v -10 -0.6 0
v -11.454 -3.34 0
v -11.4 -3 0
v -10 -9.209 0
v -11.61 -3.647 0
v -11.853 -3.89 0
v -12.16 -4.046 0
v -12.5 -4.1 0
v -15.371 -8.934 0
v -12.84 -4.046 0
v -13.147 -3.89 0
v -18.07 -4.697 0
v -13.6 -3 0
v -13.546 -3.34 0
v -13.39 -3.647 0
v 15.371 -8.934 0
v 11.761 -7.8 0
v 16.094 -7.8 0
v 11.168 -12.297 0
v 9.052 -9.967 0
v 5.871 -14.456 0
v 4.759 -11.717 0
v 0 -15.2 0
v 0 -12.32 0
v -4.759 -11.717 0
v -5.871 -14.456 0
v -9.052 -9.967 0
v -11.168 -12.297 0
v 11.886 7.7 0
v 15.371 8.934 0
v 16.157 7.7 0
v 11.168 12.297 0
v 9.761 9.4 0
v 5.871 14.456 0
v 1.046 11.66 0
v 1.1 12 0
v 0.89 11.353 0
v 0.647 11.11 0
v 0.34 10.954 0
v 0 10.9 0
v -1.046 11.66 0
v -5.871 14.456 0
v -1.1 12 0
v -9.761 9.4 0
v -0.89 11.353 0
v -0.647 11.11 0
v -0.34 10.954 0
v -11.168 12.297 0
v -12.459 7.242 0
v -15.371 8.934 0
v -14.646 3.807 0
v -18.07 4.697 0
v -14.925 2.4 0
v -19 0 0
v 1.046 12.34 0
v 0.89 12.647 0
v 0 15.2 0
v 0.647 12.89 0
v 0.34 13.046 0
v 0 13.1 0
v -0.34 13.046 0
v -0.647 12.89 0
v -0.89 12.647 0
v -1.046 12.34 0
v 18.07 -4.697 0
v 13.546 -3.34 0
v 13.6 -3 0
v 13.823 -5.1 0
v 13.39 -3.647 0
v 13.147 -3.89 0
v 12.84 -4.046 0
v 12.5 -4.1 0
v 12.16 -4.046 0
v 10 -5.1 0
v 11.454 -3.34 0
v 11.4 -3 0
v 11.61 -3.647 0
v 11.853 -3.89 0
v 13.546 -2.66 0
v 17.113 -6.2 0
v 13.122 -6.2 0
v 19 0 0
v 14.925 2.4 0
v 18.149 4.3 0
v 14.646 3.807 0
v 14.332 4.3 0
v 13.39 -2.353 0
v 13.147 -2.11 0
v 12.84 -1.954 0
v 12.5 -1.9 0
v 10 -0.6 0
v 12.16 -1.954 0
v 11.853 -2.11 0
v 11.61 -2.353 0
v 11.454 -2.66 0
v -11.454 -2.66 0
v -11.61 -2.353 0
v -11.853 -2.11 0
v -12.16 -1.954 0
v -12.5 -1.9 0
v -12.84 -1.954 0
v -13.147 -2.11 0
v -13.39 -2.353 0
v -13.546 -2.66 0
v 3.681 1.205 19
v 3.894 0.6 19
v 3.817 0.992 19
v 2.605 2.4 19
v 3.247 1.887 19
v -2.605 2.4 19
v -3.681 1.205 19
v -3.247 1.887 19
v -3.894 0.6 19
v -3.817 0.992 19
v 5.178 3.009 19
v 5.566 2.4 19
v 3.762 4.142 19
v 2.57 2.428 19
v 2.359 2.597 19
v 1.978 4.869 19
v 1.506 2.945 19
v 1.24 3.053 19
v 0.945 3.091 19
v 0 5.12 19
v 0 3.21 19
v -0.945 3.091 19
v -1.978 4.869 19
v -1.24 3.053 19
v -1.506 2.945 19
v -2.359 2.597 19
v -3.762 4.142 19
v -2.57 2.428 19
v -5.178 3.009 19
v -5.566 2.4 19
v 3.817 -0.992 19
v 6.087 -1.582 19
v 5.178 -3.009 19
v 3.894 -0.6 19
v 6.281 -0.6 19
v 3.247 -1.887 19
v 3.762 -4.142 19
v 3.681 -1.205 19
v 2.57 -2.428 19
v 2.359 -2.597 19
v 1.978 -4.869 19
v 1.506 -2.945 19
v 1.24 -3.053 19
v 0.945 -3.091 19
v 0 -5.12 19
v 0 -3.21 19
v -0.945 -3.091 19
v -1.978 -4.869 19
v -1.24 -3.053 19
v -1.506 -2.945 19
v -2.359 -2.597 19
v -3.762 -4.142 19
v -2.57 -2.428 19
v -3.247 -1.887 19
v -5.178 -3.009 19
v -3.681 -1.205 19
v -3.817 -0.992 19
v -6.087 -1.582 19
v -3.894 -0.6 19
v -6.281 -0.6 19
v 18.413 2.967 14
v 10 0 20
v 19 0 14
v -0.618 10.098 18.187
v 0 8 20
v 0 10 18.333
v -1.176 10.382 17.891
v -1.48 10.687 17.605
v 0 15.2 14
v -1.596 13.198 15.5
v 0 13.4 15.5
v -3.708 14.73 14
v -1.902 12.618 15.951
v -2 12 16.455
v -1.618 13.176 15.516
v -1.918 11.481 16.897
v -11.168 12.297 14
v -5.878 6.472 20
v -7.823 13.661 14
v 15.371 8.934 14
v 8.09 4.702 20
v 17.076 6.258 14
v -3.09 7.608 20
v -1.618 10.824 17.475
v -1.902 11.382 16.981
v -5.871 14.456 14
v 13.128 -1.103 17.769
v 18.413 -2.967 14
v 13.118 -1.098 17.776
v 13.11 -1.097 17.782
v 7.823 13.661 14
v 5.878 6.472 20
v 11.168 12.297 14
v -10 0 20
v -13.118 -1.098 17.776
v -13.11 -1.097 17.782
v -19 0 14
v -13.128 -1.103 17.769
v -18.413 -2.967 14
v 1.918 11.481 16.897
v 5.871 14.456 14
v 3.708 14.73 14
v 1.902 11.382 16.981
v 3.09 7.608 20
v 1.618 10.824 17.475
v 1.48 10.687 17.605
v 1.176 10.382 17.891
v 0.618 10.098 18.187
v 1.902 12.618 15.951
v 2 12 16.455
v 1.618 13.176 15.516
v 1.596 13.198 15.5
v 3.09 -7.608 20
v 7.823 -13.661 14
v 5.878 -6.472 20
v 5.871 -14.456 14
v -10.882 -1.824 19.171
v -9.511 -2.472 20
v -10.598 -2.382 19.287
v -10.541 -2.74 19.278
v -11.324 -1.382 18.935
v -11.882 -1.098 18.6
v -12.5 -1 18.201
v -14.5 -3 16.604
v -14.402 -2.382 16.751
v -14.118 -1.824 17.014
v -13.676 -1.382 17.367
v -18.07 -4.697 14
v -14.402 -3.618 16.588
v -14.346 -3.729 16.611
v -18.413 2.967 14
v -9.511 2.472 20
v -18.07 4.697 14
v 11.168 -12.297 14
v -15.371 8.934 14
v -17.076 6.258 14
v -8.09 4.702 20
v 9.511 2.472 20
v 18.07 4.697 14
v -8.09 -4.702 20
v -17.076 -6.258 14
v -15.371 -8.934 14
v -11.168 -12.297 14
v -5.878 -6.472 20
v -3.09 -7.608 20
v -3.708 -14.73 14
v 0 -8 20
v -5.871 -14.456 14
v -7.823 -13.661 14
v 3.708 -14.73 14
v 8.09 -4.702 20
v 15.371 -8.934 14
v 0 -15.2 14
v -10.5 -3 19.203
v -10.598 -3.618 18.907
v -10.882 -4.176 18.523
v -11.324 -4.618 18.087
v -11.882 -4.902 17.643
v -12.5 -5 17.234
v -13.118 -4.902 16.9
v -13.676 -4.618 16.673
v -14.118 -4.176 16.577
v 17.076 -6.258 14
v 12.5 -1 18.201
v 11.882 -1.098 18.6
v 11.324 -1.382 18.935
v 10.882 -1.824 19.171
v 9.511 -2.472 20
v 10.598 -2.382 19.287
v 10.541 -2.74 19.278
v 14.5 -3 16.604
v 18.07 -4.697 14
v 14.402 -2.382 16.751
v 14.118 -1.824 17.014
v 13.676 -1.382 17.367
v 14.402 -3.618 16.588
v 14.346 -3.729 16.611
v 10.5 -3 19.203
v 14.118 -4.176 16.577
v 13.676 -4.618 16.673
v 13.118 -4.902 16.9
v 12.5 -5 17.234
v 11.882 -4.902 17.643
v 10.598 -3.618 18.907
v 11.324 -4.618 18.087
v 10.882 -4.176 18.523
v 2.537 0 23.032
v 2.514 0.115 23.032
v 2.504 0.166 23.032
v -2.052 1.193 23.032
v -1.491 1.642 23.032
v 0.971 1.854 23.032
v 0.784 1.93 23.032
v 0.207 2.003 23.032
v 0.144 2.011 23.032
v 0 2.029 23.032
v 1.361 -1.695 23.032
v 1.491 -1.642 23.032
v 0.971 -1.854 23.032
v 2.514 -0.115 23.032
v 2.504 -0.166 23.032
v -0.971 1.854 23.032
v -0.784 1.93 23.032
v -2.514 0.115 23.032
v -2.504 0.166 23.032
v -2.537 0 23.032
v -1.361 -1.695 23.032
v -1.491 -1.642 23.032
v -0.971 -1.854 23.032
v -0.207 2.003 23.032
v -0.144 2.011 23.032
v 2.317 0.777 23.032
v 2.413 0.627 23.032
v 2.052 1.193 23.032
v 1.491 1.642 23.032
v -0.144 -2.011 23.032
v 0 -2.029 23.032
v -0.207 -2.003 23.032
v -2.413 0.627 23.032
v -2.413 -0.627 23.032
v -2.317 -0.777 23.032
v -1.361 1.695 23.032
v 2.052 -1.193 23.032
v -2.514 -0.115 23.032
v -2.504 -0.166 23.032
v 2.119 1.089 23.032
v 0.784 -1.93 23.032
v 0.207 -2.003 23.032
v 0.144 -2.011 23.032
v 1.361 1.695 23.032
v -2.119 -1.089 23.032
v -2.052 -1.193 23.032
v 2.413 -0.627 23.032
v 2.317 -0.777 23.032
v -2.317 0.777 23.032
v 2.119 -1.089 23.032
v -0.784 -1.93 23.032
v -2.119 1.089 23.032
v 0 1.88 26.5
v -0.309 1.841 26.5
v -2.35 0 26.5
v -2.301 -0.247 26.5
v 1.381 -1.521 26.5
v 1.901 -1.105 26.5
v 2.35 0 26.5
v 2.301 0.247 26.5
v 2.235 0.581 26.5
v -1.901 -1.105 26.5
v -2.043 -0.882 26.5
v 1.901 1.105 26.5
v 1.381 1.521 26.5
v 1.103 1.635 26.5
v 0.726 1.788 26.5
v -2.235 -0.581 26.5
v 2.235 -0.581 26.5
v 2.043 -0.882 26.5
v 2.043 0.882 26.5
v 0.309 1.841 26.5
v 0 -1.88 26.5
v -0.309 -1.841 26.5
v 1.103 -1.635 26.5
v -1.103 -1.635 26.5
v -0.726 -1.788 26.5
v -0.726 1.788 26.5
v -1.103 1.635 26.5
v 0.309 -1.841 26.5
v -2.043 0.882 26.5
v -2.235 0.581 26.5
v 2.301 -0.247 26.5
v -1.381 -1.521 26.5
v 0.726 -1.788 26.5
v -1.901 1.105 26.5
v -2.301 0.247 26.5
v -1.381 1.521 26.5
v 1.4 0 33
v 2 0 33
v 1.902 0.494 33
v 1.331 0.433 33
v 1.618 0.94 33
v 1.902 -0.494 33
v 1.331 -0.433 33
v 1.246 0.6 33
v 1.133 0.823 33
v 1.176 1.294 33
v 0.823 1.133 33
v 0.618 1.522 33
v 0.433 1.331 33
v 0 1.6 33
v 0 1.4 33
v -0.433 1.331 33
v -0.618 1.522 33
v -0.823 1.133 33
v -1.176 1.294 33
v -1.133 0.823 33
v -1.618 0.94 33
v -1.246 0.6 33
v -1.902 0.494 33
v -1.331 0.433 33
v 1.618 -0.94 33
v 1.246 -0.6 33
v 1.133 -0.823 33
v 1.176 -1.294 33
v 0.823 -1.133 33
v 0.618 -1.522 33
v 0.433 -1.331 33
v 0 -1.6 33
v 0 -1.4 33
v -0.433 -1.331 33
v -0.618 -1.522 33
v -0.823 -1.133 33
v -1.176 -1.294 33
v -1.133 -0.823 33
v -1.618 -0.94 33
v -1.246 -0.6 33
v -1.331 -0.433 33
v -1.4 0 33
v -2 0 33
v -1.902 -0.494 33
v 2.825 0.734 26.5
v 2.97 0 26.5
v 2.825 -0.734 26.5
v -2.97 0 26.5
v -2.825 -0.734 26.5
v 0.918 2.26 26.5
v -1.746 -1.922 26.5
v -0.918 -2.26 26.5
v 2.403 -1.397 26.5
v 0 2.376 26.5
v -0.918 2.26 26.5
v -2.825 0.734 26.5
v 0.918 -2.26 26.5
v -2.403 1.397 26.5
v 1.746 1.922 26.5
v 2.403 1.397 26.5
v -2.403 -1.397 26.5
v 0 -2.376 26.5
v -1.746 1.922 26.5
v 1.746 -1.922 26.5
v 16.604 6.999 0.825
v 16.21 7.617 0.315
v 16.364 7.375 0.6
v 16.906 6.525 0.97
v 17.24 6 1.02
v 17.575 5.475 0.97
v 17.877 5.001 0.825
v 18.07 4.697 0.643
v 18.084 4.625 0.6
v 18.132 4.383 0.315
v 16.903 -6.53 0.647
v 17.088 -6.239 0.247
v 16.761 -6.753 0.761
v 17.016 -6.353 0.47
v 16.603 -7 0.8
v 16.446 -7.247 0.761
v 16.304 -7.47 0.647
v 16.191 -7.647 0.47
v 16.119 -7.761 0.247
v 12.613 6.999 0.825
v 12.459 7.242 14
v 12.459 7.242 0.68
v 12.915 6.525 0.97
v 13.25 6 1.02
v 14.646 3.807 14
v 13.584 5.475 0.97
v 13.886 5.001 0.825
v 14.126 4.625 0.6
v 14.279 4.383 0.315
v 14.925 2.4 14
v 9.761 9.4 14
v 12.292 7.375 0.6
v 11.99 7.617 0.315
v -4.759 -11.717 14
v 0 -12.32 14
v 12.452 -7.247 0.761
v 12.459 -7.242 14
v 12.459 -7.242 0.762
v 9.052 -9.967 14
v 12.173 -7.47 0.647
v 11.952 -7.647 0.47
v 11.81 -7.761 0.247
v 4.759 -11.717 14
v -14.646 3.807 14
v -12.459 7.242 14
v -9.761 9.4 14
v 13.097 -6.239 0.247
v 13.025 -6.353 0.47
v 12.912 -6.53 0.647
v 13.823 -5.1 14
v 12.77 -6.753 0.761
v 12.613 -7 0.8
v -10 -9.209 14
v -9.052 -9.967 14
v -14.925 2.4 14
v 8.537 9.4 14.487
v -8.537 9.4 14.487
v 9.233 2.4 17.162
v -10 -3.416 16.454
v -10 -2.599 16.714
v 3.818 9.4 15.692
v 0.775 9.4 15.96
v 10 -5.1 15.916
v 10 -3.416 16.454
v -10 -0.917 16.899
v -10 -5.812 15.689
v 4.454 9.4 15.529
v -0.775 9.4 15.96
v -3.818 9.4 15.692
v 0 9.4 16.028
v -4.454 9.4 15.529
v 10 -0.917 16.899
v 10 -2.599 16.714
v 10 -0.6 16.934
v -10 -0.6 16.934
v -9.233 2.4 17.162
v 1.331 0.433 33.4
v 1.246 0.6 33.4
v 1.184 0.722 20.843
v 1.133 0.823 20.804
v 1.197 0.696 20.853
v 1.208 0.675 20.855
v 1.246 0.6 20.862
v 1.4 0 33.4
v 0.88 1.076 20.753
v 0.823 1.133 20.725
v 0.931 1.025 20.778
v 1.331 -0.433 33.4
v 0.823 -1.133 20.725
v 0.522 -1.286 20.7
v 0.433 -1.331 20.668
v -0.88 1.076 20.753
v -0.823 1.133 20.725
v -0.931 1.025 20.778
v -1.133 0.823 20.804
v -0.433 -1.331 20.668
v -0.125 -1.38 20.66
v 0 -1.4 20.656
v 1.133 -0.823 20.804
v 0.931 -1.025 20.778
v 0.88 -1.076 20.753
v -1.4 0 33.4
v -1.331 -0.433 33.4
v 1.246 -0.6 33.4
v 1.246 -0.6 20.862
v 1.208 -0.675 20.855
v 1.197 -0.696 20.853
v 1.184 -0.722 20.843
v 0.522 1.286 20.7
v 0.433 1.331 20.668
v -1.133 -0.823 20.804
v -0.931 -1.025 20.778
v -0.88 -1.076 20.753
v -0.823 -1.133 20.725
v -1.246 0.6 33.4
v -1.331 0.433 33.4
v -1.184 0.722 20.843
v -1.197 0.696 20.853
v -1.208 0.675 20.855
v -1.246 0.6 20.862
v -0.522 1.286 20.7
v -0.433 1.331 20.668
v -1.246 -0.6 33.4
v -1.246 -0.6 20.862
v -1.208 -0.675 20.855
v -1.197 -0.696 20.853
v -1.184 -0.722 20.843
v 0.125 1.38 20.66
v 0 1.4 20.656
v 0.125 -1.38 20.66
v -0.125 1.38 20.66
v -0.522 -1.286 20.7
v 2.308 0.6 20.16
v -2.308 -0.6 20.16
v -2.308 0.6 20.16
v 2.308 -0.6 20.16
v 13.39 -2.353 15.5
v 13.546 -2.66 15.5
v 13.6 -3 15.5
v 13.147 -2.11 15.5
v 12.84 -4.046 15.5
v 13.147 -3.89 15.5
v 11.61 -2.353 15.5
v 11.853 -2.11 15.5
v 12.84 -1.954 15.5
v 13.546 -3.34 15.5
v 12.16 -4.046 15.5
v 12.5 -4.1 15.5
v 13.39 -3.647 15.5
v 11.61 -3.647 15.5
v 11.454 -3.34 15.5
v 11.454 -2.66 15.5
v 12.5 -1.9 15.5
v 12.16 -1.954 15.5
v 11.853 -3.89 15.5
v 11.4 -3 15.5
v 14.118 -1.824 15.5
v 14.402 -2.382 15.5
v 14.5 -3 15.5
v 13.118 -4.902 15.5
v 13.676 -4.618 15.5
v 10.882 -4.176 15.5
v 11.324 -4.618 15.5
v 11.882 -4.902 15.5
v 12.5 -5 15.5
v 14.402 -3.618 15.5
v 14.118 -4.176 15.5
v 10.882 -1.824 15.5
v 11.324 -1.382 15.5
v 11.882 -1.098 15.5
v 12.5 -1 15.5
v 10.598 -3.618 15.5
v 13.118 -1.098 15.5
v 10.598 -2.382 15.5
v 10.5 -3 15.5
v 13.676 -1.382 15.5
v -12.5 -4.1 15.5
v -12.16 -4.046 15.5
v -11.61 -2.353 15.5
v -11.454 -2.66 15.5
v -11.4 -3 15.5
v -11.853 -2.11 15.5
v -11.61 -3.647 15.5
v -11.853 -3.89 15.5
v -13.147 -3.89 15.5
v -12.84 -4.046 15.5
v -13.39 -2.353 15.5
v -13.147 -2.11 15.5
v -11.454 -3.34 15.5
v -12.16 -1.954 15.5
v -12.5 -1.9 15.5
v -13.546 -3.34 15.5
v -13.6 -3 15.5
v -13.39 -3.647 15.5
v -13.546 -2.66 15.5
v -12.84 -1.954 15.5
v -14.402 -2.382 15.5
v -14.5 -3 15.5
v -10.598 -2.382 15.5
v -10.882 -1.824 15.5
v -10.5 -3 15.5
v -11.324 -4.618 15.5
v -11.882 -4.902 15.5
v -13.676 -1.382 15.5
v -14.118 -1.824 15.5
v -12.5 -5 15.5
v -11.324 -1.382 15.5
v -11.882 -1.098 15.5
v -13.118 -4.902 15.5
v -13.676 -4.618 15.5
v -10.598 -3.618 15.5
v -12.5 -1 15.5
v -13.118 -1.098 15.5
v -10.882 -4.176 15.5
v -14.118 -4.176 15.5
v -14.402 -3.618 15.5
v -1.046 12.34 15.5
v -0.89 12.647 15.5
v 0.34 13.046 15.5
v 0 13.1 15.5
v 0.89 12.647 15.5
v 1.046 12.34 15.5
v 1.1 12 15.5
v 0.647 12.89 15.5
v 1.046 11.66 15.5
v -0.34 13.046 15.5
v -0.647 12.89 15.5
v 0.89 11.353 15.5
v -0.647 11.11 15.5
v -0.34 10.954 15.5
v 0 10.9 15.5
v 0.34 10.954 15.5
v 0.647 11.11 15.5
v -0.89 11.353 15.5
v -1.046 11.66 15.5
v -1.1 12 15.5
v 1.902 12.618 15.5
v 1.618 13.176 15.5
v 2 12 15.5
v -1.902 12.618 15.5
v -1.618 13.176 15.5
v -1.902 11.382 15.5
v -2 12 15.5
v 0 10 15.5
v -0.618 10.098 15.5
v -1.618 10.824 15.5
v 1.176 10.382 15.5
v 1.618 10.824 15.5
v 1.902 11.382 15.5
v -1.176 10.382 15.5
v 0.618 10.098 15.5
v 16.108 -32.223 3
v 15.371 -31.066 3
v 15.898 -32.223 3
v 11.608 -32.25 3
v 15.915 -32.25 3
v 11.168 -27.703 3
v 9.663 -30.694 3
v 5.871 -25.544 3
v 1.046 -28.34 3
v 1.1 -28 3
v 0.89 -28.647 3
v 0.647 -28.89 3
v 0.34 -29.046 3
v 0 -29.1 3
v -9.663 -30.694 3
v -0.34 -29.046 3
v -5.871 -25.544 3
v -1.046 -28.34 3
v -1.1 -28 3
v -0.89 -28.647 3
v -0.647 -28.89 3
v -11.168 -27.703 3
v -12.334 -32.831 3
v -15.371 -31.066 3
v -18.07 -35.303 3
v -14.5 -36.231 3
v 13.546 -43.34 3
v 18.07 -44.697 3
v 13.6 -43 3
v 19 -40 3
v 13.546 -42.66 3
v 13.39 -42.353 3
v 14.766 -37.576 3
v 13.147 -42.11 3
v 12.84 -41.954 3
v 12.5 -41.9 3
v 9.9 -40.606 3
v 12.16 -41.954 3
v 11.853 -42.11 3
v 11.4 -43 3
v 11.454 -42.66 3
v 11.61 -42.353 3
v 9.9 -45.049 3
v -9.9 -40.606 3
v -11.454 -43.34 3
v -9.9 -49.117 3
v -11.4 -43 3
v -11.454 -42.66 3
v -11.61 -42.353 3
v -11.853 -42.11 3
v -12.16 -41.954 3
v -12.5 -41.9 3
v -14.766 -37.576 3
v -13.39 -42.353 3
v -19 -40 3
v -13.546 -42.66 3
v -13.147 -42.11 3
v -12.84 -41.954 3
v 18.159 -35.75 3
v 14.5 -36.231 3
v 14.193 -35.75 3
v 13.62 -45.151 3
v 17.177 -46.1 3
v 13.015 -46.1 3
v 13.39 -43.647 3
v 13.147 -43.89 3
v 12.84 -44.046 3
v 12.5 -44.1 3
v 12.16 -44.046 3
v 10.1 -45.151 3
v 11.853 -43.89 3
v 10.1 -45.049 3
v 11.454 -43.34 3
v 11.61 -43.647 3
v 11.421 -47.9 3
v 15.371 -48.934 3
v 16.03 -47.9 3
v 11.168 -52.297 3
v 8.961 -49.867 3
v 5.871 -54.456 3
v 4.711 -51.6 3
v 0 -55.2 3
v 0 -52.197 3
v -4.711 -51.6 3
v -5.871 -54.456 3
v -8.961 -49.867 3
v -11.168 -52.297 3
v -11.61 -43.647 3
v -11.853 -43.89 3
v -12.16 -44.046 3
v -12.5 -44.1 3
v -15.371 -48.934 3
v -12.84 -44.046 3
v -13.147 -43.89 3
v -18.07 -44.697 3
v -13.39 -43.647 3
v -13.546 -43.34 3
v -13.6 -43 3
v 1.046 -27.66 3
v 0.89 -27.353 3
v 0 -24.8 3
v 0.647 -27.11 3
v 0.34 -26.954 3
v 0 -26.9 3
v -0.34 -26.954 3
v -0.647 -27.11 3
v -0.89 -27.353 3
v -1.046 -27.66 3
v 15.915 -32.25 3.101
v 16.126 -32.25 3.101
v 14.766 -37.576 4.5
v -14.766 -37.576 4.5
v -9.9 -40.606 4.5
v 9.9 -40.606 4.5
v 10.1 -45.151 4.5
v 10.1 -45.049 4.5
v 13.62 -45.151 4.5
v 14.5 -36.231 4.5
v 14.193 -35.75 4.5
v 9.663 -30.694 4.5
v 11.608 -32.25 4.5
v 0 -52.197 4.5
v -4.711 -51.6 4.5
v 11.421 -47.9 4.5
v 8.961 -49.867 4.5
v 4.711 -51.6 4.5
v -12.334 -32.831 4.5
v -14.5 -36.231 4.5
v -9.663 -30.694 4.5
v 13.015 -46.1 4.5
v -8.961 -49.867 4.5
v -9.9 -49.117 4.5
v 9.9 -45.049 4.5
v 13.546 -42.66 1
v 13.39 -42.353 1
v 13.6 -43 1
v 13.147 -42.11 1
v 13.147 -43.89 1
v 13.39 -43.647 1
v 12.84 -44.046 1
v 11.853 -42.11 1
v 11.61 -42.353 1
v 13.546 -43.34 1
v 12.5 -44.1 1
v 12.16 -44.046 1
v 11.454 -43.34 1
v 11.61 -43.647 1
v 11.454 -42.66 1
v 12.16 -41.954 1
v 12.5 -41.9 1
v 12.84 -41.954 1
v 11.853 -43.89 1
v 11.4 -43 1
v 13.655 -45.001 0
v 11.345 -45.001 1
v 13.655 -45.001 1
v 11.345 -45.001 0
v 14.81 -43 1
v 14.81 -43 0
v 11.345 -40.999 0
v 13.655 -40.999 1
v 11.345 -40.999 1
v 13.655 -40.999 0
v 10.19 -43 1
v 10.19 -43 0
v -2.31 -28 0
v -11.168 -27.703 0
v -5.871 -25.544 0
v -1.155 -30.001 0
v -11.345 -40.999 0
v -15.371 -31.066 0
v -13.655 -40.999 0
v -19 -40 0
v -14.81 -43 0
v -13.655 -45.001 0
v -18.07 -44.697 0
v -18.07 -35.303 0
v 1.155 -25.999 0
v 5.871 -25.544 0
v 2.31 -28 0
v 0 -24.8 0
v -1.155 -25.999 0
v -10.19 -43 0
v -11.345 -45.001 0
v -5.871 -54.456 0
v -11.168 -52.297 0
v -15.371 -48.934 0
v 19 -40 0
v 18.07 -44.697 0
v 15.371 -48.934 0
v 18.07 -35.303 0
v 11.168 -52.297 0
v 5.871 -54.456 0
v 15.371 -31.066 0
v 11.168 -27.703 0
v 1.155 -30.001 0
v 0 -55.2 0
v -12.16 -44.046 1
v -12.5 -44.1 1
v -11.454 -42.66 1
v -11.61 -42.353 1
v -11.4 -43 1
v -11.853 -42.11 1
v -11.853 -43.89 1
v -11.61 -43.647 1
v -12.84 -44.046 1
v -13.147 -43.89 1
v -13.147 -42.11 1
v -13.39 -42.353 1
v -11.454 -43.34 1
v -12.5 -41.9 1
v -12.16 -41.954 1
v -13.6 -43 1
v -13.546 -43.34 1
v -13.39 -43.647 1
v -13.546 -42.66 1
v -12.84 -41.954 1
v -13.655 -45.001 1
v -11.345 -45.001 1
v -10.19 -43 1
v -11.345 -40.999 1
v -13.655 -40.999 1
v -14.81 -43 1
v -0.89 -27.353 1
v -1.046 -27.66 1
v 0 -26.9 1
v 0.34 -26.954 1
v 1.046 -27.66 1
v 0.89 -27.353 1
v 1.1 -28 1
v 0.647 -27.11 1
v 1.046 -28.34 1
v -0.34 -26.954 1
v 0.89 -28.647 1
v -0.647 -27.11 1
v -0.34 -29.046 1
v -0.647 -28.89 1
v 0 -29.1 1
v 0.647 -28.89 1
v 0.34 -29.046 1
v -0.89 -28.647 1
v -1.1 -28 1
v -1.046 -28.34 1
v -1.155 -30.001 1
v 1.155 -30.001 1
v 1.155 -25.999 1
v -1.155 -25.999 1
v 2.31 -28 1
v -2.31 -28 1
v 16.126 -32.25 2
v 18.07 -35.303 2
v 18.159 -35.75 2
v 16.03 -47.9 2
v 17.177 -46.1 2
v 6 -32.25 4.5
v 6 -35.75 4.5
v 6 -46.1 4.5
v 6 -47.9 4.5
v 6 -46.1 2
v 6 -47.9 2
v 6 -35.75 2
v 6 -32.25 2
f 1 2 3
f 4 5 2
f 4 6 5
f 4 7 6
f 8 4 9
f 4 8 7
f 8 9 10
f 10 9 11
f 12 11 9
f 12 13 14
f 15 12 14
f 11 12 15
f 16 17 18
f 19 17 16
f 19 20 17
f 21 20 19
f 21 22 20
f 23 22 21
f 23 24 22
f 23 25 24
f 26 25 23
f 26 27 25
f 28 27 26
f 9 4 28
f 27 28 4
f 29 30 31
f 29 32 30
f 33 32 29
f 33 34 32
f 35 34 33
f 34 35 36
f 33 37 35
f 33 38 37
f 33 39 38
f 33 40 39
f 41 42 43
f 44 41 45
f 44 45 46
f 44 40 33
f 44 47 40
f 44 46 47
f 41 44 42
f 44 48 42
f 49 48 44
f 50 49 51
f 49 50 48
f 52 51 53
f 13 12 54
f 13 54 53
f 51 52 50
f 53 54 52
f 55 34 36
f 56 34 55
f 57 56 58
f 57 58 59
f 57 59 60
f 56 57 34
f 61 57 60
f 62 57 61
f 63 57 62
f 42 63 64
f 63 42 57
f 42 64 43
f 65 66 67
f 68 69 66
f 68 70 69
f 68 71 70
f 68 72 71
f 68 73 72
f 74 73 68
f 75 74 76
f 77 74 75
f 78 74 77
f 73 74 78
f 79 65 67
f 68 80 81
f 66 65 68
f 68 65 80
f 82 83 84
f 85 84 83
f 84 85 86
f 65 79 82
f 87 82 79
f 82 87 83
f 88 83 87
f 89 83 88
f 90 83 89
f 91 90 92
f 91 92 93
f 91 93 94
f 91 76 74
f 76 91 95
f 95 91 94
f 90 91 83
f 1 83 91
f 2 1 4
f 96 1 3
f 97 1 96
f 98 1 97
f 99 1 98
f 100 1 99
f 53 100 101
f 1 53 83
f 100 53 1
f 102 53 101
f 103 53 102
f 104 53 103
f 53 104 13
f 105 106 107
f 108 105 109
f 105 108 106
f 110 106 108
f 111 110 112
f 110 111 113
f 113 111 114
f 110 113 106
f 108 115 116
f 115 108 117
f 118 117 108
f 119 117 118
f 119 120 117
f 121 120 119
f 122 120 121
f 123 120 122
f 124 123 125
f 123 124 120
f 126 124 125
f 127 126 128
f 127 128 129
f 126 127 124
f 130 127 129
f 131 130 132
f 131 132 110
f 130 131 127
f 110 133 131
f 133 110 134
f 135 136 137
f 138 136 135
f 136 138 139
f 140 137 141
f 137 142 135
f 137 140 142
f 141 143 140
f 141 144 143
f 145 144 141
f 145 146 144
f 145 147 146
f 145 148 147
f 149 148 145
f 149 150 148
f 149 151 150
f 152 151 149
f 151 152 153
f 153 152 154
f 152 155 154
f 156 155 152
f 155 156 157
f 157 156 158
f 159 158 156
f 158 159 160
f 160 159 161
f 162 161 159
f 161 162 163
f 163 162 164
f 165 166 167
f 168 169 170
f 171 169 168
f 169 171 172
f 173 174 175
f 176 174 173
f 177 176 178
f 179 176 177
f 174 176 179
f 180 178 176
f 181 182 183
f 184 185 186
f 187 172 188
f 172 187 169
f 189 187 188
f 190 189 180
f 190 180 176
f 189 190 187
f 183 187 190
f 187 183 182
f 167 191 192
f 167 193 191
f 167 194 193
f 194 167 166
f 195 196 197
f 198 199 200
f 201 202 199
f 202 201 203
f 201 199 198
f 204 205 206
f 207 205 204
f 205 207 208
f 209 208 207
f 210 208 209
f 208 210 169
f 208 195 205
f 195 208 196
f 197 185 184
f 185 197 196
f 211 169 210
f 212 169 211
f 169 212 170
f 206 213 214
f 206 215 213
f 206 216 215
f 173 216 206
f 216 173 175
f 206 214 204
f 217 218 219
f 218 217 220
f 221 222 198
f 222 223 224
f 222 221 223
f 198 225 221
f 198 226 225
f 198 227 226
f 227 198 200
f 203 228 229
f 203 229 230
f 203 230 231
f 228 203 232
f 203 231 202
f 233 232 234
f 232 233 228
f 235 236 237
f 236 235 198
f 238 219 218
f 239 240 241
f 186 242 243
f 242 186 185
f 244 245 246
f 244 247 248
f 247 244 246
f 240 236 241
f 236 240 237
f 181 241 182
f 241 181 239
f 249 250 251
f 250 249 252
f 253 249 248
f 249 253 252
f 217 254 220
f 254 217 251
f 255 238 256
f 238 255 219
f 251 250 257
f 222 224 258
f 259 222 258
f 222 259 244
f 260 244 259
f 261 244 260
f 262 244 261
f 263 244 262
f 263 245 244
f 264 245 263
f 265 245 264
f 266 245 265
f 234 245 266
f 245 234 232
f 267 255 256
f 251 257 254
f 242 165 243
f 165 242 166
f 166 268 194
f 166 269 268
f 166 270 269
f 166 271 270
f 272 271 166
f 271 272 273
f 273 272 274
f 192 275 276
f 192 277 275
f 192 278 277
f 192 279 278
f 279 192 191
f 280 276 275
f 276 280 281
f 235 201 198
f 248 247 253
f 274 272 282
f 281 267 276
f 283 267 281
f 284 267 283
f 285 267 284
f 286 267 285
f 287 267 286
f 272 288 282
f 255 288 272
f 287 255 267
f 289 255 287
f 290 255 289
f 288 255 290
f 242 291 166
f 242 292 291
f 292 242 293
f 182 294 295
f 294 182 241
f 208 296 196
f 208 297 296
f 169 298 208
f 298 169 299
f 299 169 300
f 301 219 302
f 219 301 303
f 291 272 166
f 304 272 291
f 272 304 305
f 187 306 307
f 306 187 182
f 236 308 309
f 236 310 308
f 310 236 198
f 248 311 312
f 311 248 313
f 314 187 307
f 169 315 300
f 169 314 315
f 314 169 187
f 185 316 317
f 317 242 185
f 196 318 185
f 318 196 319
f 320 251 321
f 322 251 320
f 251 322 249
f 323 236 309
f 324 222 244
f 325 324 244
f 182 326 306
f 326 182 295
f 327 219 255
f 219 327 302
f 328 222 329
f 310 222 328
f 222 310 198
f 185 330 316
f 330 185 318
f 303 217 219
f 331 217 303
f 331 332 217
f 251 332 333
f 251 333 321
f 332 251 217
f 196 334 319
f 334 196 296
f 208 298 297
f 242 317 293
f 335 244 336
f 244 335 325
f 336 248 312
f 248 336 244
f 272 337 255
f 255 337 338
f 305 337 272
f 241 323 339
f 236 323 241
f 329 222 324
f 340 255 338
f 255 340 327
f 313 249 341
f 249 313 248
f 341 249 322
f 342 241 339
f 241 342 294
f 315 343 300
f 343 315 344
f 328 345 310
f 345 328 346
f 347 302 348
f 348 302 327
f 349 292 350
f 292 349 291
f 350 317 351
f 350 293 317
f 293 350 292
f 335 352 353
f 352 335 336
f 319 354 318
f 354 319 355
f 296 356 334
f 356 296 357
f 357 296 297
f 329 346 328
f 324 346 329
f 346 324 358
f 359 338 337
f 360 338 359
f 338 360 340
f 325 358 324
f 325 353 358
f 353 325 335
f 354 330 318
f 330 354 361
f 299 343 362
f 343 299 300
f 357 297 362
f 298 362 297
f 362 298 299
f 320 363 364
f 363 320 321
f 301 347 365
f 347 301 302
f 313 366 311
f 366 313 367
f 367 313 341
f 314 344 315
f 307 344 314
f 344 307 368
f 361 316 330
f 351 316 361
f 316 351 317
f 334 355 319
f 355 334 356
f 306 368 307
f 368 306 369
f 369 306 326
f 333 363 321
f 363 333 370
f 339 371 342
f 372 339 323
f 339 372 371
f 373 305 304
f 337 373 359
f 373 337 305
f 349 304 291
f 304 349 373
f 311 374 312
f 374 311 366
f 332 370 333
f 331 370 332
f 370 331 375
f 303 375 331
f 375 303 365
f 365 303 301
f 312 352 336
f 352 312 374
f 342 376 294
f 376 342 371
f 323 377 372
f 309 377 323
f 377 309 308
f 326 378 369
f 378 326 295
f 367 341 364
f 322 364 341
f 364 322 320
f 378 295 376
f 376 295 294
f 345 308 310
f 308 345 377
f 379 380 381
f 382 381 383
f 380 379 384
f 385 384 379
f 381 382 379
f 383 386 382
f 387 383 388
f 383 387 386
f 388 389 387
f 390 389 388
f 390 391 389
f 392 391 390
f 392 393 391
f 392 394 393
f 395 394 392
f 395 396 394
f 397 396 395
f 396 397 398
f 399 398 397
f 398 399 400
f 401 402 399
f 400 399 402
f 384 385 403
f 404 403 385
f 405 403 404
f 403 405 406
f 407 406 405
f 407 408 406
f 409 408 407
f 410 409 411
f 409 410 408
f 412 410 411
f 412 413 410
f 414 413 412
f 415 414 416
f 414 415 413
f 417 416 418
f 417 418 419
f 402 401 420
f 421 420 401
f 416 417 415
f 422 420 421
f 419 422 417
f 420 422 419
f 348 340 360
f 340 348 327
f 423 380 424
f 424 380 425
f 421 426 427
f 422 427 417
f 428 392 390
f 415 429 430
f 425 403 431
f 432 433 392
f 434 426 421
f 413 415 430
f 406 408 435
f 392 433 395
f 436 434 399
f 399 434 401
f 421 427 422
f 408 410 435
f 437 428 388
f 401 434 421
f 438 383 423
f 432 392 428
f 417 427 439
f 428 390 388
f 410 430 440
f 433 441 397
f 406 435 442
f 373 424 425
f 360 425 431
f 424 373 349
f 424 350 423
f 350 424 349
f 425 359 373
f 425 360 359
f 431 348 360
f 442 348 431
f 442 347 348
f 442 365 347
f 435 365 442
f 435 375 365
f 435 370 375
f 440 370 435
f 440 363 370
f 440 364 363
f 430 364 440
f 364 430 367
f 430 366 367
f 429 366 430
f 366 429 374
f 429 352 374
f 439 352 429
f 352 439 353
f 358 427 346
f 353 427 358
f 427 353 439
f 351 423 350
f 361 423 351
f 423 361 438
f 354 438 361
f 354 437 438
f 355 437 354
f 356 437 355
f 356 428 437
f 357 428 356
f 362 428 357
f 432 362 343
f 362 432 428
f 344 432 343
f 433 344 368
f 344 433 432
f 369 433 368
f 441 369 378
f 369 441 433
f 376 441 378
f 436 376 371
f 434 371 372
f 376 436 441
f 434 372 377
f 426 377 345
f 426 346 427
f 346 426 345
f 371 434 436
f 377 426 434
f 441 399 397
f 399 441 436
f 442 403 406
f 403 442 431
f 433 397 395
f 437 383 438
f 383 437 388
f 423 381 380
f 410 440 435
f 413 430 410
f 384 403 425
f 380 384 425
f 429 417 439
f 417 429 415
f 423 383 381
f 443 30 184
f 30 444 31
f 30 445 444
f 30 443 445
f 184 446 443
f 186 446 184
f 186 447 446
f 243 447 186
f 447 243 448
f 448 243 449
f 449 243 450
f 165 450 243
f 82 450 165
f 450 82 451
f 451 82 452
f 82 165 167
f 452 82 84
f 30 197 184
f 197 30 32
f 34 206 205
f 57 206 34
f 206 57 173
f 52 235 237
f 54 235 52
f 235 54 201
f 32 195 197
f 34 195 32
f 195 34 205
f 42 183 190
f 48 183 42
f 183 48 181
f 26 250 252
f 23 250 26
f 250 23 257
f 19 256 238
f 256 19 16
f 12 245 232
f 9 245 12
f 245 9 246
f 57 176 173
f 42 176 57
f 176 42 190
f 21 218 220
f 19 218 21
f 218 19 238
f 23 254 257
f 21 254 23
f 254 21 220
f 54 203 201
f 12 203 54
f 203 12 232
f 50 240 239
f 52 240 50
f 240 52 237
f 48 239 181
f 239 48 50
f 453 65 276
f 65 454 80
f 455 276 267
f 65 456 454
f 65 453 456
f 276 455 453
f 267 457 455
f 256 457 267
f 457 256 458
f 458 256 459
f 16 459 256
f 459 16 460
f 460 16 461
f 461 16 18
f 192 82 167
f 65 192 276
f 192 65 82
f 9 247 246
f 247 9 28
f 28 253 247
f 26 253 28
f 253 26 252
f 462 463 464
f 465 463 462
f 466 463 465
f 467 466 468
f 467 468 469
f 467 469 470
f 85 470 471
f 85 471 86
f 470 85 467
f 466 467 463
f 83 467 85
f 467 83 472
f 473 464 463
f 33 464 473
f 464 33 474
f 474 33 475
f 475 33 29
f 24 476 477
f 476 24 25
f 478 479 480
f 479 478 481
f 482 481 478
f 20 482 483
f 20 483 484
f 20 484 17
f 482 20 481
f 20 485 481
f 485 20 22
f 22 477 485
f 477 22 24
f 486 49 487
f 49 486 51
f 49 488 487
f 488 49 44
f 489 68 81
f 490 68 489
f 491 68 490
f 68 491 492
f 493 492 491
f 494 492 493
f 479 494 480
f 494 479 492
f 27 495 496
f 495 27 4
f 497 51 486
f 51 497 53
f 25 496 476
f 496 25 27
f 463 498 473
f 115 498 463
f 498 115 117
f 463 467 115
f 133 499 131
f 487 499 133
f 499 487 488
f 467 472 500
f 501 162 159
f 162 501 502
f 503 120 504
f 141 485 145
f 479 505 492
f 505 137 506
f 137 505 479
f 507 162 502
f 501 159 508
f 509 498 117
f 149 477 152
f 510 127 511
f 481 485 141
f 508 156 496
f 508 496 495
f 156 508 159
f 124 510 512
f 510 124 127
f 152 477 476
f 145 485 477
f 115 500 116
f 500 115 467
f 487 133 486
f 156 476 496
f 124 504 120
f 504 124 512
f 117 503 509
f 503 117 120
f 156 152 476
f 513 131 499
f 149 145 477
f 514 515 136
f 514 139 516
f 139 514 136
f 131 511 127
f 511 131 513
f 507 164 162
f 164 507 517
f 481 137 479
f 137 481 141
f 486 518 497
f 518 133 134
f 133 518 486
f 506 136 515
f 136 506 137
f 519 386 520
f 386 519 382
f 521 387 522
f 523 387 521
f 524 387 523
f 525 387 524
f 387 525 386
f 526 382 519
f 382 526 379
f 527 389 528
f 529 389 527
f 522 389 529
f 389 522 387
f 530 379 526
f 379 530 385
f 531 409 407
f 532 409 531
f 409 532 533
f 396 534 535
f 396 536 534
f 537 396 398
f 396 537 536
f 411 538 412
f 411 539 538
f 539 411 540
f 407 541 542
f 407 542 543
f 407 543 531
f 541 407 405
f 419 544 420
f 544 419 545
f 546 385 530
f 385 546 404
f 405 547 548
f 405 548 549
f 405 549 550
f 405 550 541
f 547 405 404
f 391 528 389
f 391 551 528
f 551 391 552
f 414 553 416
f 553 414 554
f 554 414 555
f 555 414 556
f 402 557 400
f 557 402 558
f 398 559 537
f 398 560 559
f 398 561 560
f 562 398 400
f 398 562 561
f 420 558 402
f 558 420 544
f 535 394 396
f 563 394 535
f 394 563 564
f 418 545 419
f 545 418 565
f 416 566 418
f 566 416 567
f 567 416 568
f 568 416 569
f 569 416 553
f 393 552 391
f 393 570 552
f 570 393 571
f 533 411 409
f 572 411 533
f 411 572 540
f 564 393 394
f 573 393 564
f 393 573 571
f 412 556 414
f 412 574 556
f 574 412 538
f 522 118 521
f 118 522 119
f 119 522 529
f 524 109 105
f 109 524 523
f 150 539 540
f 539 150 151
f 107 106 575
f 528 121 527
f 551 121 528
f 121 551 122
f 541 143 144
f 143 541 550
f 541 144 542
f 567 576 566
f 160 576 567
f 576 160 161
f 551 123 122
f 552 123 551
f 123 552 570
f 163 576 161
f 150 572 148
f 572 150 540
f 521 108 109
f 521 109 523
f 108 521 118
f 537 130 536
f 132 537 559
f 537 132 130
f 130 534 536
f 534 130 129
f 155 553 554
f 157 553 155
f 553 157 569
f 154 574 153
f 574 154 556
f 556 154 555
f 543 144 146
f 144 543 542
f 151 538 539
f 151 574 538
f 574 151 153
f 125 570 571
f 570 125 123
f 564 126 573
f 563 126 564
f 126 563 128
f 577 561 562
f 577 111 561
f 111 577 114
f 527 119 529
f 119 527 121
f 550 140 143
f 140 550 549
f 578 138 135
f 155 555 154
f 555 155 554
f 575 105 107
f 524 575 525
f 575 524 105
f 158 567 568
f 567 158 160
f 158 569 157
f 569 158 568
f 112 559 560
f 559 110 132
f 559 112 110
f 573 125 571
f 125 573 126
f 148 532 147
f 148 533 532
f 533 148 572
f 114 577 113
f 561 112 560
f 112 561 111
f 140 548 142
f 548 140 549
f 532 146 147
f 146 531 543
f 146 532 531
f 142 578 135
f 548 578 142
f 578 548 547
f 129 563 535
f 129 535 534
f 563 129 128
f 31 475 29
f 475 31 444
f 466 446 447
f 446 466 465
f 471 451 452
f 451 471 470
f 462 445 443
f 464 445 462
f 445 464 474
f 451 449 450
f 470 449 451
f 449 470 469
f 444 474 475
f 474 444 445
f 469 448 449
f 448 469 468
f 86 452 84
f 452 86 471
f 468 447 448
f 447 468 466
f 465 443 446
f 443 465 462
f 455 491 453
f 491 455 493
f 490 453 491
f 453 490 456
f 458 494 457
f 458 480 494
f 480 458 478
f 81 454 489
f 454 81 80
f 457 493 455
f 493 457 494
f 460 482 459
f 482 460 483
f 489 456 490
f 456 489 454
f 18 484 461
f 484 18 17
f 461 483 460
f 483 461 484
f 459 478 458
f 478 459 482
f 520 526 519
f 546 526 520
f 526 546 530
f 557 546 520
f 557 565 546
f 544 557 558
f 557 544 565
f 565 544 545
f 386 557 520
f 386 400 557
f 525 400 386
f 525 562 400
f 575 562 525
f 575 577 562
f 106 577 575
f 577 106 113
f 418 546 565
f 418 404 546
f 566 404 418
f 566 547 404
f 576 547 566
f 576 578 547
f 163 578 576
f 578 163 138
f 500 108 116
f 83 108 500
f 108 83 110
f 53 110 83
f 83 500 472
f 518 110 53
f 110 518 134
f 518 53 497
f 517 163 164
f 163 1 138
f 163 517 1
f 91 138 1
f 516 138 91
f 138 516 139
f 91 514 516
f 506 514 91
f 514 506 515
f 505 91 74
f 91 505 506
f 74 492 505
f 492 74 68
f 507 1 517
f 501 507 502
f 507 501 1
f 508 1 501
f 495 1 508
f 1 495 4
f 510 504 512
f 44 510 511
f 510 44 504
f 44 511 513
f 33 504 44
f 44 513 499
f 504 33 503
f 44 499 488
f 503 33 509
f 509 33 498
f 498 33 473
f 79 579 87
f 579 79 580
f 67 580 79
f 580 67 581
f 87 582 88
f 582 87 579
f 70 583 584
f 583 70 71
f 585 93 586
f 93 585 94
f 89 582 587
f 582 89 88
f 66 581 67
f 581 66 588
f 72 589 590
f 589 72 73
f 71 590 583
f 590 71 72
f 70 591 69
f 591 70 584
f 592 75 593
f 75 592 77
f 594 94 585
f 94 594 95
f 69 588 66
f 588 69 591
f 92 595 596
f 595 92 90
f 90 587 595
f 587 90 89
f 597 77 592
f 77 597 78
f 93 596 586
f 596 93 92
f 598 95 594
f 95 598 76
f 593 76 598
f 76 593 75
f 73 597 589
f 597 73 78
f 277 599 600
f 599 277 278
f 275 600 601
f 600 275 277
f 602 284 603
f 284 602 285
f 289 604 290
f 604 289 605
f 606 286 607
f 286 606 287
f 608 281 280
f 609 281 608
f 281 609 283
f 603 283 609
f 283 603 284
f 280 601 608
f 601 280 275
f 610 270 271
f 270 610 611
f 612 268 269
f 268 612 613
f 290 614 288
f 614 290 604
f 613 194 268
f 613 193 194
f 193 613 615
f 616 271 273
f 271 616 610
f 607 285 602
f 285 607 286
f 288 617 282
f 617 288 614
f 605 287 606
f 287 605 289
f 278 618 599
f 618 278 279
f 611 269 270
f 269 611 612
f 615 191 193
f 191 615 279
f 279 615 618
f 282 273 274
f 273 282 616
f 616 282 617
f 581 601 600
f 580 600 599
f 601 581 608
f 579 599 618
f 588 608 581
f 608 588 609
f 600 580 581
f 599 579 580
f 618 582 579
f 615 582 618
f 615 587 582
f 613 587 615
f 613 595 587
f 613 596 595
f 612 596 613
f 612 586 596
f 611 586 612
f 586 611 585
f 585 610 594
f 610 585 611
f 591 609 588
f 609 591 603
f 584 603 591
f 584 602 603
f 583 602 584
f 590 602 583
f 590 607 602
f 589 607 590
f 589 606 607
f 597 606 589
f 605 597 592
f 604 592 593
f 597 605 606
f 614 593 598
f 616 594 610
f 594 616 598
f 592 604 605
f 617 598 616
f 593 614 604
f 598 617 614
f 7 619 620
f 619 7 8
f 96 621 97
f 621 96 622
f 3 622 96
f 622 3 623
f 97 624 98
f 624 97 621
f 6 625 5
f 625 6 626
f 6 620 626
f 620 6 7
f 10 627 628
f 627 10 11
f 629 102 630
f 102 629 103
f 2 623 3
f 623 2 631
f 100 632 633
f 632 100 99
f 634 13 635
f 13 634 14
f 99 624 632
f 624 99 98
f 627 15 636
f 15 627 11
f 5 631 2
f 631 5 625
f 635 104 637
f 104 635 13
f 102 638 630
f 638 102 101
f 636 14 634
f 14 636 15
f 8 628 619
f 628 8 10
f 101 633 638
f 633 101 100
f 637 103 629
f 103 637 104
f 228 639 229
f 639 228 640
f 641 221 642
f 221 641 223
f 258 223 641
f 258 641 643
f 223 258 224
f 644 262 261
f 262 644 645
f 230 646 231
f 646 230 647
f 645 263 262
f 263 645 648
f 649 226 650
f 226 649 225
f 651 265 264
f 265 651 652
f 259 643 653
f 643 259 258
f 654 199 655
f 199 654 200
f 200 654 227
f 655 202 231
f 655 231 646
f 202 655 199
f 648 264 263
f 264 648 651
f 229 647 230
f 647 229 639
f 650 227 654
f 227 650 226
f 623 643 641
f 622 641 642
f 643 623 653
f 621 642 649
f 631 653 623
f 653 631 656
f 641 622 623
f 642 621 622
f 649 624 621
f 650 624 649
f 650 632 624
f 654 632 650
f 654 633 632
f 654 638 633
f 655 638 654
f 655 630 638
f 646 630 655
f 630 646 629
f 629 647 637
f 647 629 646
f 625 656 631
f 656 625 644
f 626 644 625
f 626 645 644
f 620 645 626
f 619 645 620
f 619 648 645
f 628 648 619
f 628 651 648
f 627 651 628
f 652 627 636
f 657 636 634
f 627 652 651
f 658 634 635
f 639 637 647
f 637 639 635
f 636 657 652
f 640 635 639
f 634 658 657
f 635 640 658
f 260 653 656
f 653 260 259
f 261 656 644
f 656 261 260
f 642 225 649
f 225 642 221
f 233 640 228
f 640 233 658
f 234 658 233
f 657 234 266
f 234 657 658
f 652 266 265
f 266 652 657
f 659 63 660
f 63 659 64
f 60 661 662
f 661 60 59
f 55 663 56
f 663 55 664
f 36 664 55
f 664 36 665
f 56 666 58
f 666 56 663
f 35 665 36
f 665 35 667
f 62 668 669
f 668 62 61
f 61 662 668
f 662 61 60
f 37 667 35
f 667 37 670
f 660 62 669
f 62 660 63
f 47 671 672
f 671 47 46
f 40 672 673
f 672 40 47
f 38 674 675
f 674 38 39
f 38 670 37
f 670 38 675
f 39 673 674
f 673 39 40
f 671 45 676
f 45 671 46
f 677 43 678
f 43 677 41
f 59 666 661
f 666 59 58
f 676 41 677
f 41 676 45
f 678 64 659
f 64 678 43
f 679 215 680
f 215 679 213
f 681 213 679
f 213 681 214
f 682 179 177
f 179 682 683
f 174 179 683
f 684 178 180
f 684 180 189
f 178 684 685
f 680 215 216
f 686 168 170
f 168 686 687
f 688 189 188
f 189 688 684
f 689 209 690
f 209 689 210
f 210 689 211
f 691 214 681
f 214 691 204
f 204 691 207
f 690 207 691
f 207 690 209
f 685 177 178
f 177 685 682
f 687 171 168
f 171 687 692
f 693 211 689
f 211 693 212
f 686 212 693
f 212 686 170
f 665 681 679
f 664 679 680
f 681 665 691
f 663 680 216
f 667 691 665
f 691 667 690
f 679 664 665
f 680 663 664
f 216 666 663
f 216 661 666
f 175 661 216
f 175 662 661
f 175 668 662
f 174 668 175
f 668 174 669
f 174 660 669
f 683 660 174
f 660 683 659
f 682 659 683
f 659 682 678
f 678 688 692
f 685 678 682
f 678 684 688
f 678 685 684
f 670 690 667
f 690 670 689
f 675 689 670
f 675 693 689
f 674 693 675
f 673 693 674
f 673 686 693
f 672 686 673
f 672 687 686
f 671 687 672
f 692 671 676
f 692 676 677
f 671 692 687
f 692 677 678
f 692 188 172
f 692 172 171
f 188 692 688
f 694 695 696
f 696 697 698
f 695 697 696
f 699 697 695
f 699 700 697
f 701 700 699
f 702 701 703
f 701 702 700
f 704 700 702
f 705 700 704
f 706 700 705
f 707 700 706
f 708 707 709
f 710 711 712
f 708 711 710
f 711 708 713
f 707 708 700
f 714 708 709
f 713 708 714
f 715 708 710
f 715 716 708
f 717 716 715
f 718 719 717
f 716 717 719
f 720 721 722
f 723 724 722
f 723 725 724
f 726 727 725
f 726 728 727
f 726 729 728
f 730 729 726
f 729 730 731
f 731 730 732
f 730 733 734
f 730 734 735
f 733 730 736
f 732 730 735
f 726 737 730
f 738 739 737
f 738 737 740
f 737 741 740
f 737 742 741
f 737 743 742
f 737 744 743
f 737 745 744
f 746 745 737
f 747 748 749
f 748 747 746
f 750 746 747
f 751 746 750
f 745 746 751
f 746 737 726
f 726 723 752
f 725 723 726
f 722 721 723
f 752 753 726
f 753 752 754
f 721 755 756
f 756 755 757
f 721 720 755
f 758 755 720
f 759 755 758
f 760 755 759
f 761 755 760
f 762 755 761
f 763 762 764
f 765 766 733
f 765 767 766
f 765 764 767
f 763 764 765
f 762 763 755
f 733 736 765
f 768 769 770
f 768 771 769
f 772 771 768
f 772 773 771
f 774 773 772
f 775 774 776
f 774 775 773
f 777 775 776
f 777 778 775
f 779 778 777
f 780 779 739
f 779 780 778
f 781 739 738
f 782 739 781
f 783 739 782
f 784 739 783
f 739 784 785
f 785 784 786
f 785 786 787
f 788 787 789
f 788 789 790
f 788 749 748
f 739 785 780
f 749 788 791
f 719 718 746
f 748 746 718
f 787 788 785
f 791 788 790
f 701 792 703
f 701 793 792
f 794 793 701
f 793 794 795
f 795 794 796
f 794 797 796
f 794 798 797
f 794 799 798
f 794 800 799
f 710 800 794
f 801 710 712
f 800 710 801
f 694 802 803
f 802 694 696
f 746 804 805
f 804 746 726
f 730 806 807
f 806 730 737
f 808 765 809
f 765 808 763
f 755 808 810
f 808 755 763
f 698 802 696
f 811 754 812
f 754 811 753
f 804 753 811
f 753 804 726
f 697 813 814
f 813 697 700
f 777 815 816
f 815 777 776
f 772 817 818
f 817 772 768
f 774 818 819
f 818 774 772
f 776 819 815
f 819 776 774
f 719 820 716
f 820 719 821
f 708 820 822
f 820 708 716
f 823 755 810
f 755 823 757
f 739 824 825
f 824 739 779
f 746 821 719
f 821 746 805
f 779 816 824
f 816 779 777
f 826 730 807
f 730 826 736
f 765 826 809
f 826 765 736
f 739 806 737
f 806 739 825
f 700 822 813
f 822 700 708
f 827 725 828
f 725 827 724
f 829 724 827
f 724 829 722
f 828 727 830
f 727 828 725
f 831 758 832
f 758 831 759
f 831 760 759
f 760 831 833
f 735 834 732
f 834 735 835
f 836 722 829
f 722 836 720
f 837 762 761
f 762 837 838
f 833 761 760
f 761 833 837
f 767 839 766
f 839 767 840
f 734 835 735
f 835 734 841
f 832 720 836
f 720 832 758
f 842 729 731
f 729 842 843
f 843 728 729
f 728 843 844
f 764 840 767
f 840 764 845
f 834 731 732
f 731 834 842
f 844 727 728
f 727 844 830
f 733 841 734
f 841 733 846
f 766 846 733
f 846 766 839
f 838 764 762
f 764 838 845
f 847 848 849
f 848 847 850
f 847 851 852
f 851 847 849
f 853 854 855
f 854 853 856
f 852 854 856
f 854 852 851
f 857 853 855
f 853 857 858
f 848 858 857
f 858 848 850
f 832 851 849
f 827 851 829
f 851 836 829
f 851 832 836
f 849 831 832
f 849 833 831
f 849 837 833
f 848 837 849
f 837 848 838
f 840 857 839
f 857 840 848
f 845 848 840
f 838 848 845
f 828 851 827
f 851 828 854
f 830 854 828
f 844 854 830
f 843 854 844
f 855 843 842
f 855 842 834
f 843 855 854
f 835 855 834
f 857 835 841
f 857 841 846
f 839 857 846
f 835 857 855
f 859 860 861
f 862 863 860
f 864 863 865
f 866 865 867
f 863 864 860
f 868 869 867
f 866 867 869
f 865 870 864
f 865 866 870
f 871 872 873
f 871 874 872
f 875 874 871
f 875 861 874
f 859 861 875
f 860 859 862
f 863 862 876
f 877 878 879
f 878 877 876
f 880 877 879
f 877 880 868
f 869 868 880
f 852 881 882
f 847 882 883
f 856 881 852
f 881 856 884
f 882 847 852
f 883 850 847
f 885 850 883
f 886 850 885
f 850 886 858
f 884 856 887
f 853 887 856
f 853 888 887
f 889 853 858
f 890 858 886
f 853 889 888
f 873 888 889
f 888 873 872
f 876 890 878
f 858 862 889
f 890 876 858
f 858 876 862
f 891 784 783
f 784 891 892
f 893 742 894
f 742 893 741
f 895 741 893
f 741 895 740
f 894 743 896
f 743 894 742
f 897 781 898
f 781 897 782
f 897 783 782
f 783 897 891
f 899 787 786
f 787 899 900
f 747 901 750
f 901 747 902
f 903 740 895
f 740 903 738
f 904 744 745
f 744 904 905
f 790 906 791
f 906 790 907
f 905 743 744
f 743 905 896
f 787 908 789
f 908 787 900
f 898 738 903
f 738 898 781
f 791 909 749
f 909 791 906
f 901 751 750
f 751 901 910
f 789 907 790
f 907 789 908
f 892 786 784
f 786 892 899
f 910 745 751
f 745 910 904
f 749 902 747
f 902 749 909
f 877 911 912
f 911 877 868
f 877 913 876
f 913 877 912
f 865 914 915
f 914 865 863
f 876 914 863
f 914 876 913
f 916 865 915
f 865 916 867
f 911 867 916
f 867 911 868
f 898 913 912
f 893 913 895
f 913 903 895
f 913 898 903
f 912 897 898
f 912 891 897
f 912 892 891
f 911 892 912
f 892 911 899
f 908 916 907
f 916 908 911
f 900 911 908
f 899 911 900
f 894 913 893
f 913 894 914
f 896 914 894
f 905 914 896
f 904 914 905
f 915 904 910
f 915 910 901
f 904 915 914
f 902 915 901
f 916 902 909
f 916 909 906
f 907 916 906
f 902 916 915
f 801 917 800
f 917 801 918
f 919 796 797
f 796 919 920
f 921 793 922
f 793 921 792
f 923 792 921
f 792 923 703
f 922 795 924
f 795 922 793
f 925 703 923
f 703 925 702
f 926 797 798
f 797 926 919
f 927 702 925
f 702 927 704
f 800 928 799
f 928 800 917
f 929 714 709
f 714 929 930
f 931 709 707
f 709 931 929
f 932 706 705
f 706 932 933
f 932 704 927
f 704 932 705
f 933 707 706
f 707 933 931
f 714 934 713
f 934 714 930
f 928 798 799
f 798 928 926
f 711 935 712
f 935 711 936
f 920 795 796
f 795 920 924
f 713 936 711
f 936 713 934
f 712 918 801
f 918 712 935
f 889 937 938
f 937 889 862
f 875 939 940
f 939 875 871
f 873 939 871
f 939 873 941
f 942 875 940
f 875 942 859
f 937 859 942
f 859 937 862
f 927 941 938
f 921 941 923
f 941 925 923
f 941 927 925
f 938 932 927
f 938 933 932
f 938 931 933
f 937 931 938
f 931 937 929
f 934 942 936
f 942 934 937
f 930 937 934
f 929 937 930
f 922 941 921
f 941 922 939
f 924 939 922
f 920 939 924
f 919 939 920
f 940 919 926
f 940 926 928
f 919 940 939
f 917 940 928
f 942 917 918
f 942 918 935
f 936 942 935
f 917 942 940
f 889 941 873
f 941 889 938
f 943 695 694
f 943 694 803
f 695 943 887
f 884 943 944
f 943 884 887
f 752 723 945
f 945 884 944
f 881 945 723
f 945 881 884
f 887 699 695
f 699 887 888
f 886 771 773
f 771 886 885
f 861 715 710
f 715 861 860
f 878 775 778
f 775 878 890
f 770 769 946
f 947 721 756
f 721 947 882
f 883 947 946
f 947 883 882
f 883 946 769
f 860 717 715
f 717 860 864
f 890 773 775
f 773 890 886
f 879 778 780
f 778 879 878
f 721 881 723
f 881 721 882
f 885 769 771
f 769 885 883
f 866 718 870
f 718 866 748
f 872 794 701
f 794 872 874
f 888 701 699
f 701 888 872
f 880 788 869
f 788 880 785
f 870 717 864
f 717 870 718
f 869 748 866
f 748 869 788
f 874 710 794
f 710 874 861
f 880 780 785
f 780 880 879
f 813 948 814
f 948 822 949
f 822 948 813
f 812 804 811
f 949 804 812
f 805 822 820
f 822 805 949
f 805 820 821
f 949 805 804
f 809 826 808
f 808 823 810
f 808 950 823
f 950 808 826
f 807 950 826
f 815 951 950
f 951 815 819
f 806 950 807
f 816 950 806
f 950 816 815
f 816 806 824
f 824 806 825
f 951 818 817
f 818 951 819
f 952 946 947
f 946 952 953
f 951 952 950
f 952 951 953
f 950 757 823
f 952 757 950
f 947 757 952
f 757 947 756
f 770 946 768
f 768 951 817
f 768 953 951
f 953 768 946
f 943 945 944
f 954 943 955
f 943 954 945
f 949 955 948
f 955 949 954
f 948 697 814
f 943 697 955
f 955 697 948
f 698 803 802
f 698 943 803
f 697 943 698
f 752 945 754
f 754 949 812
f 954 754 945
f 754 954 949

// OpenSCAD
////use $fn=1000 for manufacturing. 
// rendering with 1K facet number is taking 8 minutes
$fn=20; 

ld=20;  // base of main housing: 15.5 mm radius => 31mm length end to end
sd=ld/2;  // top of main housing:.7.5mm radius => 1 mm length end to end
h0=15+5;        // hight of main housing
ht=12+1;        // hight of tip from top of main housing
r1t=2.7;      // bottom radius of the tip
r2t=2;      // top radious of the tip
rTipHole=r2t*0.7; // radious of tip hole
speakerSpaceDividerWidth= 2 * rTipHole*1.1;
yScale=0.8;

    // speaker housing
// make sure this fuses with tip of speaker without sharp edges.
speakerR=(13)/2; // 15mm speaker + space
speakerFillerH=h0*0.4956; // connection point of speaker to tip's hollow channels
speakerCenterX=8;
speakerCenterY=5;
micCenterX=-6;
micCenterY=-8;

draw2();
translate([0,-40,0]) backPlate();
//translate([0,40,0]) tipBlocker();
//translate([0,40,0]) testChamber();
//drawWithCut(0,51);
//drawInner3();
//micHousing();
//translate([0,-28,8]) PCB();
//mainWall();

module torus(r1=10.2,r2=2.2)
{
  rotate_extrude()
    translate([(r1-r2)/2, 0, 0])
        circle(r = r2/2);
}

module drawInner3()
{
    z1=40;//4.35;
    scale([1,yScale,1]) 
      cylinder(h=h0/z1, r1=ld, r2=sd-(1-1/z1)*(sd-ld)); 
    tipHole();
    tipWall();
    mainWall();
    jack();
}

module drawSpeakersAndMic()
{
    jack();
}

module drawWithCut(x=0,y=0)
{
    difference()
    {
        draw2();
        translate([-50+x, -50+y,0])
        //translate([0,0.75,0])
          cube([100, 50, 50]);
    }
}

module draw2()
{
  difference()
  {
  union()
  {
  difference() 
  {
    drawMain_Tubes_MicTubeAllTheWay_SpeakerTubeHalfWay();
    drawSpeakersAndMic();
  }
  mainWall();
  }
  snipPins(lowerHead=0);
  }
}


module drawMain_Tubes_MicTubeAllTheWay_SpeakerTubeHalfWay()
{
union()
{
difference()
    {
  mainBlock();
  tipHole();
    }
tipWall();
}
}

module mainInner()
{
  dw=3.6;
  cylinder(h=h0-6,r1=ld-1-dw,r2=ld-1-dw);
  translate([0,0,h0-6])
  cylinder(h=5,r1=ld-1-dw,r2=sd-dw);
}

module mainWall()
{
    ww=1.2;
    wBigWall=3;
    
    intersection()
    {
      translate([-50,-ww/2,0])
      cube([100,ww,h0+ht+0.4]);
        tipHole();
    }
    
    intersection()
    {
        
    mainInner();
        
    // lower wall is 0.6mm offcenter to give more space to the speaker
    translate([0,(wBigWall-ww)/2,0])
    union()
    {
      cube([100,wBigWall,100],center=true);
      // ticker walls on ends for screws
      translate([10,-6,0])
      cube([6,6,100]);
      translate([-10-6,-100,0])
      cube([6,100,100]);

      translate([-10,8.5,0])
      cube([10*2,2.8,100]);
    }
    }
}

module p6(h=5,r=1)
 {
   difference()
     {
   linear_extrude(h)
   polygon(
    [[0,0],
    [1*r*sin(120),1*r*cos(120)],
    [1*r*sin(150),1*r*cos(150)],
    [1*r*sin(180),1*r*cos(180)],
    [1*r*sin(210),1*r*cos(210)],
    [1*r*sin(240),1*r*cos(240)]]);
   translate([5,0,h])
     rotate([-50,0,180])
     cube(10);
     }
}
 
// the wall width at the top of the tip is 0.3*r2t=0.6 mm. is this too small? 
module tipHole()
{
  translate([0,0,speakerFillerH+8])
  cylinder(h=h0+ht+1.5,r1=rTipHole,r2=rTipHole);
  translate([0,0,speakerFillerH+5])
  scale([1,yScale,1])
  cylinder(h=6,r1=rTipHole+8.2,r2=rTipHole);
};


// tip wall width is 0.6 mm. should be ok.
// tip wall length is 1.5*.9=1.35 mm.
module tipWall()
{
}

module snipPins(lowerHead=1)
{
    sc=1.2;
    
    sx=11.5;
    sy=4;

    snipPin(sx+1,-sy+1, lowerHead);
    snipPin(-sx-1,-sy+1, lowerHead);
    snipPin(0,12, lowerHead);
}

module jack()
{
    // wire hole
    translate([11,6,0])
    rotate([0,90,0])
    scale([0.6,1,1])
    cylinder(h=9,r=1.7);

    translate([11,-7,0])
    rotate([0,90,0])
    cylinder(h=9,r=0.8);
}

module snipPin(x=0,y=0,lowerHead=1)
{
    // M3 screw, 5mm
    translate([x,y,-2])
    cylinder(h=20,r1=1.1,r2=1.1);
    
    translate([x,y,15.5])
    cylinder(h=10,r1=2,r2=2);

    // head space at the bottom
    if(lowerHead==1)
    {
    // one edge is 4mm.
    translate([x,y,0])
    cylinder(h=1,r=2.31,$fn=6);
    //linear_extrude(20)    circle(2.31,$fn=6);
    }        
}

module backPlate()
{
    zh=1.5; // outer wall hight
    z1=3; // base thickness
    
    tolerance=0.01;
    
  difference()
  {
    scale([1,yScale,1])
    cylinder(h=zh+z1, r1=ld-1, r2=ld-1); 
    translate([0,0,z1])
    {
      scale([1+tolerance,1+tolerance,1])
         draw2();
      scale([1-tolerance,1-tolerance,1])
        draw2();
    }
    
    //make sure these numbers are in sync with jack();
    /*
    
    translate([11,6,0])
    rotate([0,90,0])
    scale([0.6,1,1])
    cylinder(h=9,r=1.7);

    translate([11,-7,0])
    rotate([0,90,0])
    cylinder(h=9,r=0.8);
    */
    translate([16,-7,z1+5-1])
    cube([20,1.8,10],center=true);
    translate([16,6,z1+5-1])
    cube([20,3.5,10],center=true);
    snipPins();
  }
}

module outerBulk()
{
  difference()
  {
    union()
    {
    cylinder(h=h0, r1=ld+20, r2=sd); 

    translate([0,0,h0])
    cylinder(h=ht/4, r1=sd, r2=r2t); 
    
    translate([0,0,h0])
      cylinder(h=ht, r1=r1t, r2=r2t); 
    
    translate([0,0,h0+ht/2])
      cylinder(h=ht/2, r1=r1t*1.1, r2=r2t);
    }
  
    circularWallWithGap(height=16,innerRadius=ld-1,width=55,gapAngle=0);
  }
}

module mainBlock()
{
    scale([1,yScale,1]) 
  difference()
    {
  outerBulk();
  mainInner();
  }
}


module testChamber()
{
    scale([1,yScale,1])
    difference()
    {
    cylinder(h=40,r=ld+3);
        
    translate([0,0,20])
      cylinder(h=40,r=sd);
    
    translate([0,0,h0+ht+21.7])
    rotate([180,0,0])
    outerBulk();
    }
}

module tipBlocker()
{
    tolerance=0.04;
    difference()
    {
    cylinder(h=5,r=4);
    translate([0,0,h0+ht+3])
    rotate([180,0,0])
    scale([1+tolerance,1+tolerance,1])
    draw2();
    translate([0,0,h0+ht+3])
    rotate([180,0,0])
    scale([1-tolerance,1-tolerance,1])
    draw2();
    }
}

module circularWallWithGap(height=2,innerRadius=11,width=1,
gapAngle=90)
{
    difference()
    {
        cylinder(h=height,r1=innerRadius+width,r2=innerRadius+width,center=false);
        cylinder(h=height,r1=innerRadius,r2=innerRadius,center=false);
        //translate([20,-innerRadius*1.5,0])
        //cube([3*innerRadius,3*innerRadius,height]);
    }
}

module PCB()
{
    // PCB outer dimensions.
    // This should fit in the base
    cube([22,18,1],center=true);
}
